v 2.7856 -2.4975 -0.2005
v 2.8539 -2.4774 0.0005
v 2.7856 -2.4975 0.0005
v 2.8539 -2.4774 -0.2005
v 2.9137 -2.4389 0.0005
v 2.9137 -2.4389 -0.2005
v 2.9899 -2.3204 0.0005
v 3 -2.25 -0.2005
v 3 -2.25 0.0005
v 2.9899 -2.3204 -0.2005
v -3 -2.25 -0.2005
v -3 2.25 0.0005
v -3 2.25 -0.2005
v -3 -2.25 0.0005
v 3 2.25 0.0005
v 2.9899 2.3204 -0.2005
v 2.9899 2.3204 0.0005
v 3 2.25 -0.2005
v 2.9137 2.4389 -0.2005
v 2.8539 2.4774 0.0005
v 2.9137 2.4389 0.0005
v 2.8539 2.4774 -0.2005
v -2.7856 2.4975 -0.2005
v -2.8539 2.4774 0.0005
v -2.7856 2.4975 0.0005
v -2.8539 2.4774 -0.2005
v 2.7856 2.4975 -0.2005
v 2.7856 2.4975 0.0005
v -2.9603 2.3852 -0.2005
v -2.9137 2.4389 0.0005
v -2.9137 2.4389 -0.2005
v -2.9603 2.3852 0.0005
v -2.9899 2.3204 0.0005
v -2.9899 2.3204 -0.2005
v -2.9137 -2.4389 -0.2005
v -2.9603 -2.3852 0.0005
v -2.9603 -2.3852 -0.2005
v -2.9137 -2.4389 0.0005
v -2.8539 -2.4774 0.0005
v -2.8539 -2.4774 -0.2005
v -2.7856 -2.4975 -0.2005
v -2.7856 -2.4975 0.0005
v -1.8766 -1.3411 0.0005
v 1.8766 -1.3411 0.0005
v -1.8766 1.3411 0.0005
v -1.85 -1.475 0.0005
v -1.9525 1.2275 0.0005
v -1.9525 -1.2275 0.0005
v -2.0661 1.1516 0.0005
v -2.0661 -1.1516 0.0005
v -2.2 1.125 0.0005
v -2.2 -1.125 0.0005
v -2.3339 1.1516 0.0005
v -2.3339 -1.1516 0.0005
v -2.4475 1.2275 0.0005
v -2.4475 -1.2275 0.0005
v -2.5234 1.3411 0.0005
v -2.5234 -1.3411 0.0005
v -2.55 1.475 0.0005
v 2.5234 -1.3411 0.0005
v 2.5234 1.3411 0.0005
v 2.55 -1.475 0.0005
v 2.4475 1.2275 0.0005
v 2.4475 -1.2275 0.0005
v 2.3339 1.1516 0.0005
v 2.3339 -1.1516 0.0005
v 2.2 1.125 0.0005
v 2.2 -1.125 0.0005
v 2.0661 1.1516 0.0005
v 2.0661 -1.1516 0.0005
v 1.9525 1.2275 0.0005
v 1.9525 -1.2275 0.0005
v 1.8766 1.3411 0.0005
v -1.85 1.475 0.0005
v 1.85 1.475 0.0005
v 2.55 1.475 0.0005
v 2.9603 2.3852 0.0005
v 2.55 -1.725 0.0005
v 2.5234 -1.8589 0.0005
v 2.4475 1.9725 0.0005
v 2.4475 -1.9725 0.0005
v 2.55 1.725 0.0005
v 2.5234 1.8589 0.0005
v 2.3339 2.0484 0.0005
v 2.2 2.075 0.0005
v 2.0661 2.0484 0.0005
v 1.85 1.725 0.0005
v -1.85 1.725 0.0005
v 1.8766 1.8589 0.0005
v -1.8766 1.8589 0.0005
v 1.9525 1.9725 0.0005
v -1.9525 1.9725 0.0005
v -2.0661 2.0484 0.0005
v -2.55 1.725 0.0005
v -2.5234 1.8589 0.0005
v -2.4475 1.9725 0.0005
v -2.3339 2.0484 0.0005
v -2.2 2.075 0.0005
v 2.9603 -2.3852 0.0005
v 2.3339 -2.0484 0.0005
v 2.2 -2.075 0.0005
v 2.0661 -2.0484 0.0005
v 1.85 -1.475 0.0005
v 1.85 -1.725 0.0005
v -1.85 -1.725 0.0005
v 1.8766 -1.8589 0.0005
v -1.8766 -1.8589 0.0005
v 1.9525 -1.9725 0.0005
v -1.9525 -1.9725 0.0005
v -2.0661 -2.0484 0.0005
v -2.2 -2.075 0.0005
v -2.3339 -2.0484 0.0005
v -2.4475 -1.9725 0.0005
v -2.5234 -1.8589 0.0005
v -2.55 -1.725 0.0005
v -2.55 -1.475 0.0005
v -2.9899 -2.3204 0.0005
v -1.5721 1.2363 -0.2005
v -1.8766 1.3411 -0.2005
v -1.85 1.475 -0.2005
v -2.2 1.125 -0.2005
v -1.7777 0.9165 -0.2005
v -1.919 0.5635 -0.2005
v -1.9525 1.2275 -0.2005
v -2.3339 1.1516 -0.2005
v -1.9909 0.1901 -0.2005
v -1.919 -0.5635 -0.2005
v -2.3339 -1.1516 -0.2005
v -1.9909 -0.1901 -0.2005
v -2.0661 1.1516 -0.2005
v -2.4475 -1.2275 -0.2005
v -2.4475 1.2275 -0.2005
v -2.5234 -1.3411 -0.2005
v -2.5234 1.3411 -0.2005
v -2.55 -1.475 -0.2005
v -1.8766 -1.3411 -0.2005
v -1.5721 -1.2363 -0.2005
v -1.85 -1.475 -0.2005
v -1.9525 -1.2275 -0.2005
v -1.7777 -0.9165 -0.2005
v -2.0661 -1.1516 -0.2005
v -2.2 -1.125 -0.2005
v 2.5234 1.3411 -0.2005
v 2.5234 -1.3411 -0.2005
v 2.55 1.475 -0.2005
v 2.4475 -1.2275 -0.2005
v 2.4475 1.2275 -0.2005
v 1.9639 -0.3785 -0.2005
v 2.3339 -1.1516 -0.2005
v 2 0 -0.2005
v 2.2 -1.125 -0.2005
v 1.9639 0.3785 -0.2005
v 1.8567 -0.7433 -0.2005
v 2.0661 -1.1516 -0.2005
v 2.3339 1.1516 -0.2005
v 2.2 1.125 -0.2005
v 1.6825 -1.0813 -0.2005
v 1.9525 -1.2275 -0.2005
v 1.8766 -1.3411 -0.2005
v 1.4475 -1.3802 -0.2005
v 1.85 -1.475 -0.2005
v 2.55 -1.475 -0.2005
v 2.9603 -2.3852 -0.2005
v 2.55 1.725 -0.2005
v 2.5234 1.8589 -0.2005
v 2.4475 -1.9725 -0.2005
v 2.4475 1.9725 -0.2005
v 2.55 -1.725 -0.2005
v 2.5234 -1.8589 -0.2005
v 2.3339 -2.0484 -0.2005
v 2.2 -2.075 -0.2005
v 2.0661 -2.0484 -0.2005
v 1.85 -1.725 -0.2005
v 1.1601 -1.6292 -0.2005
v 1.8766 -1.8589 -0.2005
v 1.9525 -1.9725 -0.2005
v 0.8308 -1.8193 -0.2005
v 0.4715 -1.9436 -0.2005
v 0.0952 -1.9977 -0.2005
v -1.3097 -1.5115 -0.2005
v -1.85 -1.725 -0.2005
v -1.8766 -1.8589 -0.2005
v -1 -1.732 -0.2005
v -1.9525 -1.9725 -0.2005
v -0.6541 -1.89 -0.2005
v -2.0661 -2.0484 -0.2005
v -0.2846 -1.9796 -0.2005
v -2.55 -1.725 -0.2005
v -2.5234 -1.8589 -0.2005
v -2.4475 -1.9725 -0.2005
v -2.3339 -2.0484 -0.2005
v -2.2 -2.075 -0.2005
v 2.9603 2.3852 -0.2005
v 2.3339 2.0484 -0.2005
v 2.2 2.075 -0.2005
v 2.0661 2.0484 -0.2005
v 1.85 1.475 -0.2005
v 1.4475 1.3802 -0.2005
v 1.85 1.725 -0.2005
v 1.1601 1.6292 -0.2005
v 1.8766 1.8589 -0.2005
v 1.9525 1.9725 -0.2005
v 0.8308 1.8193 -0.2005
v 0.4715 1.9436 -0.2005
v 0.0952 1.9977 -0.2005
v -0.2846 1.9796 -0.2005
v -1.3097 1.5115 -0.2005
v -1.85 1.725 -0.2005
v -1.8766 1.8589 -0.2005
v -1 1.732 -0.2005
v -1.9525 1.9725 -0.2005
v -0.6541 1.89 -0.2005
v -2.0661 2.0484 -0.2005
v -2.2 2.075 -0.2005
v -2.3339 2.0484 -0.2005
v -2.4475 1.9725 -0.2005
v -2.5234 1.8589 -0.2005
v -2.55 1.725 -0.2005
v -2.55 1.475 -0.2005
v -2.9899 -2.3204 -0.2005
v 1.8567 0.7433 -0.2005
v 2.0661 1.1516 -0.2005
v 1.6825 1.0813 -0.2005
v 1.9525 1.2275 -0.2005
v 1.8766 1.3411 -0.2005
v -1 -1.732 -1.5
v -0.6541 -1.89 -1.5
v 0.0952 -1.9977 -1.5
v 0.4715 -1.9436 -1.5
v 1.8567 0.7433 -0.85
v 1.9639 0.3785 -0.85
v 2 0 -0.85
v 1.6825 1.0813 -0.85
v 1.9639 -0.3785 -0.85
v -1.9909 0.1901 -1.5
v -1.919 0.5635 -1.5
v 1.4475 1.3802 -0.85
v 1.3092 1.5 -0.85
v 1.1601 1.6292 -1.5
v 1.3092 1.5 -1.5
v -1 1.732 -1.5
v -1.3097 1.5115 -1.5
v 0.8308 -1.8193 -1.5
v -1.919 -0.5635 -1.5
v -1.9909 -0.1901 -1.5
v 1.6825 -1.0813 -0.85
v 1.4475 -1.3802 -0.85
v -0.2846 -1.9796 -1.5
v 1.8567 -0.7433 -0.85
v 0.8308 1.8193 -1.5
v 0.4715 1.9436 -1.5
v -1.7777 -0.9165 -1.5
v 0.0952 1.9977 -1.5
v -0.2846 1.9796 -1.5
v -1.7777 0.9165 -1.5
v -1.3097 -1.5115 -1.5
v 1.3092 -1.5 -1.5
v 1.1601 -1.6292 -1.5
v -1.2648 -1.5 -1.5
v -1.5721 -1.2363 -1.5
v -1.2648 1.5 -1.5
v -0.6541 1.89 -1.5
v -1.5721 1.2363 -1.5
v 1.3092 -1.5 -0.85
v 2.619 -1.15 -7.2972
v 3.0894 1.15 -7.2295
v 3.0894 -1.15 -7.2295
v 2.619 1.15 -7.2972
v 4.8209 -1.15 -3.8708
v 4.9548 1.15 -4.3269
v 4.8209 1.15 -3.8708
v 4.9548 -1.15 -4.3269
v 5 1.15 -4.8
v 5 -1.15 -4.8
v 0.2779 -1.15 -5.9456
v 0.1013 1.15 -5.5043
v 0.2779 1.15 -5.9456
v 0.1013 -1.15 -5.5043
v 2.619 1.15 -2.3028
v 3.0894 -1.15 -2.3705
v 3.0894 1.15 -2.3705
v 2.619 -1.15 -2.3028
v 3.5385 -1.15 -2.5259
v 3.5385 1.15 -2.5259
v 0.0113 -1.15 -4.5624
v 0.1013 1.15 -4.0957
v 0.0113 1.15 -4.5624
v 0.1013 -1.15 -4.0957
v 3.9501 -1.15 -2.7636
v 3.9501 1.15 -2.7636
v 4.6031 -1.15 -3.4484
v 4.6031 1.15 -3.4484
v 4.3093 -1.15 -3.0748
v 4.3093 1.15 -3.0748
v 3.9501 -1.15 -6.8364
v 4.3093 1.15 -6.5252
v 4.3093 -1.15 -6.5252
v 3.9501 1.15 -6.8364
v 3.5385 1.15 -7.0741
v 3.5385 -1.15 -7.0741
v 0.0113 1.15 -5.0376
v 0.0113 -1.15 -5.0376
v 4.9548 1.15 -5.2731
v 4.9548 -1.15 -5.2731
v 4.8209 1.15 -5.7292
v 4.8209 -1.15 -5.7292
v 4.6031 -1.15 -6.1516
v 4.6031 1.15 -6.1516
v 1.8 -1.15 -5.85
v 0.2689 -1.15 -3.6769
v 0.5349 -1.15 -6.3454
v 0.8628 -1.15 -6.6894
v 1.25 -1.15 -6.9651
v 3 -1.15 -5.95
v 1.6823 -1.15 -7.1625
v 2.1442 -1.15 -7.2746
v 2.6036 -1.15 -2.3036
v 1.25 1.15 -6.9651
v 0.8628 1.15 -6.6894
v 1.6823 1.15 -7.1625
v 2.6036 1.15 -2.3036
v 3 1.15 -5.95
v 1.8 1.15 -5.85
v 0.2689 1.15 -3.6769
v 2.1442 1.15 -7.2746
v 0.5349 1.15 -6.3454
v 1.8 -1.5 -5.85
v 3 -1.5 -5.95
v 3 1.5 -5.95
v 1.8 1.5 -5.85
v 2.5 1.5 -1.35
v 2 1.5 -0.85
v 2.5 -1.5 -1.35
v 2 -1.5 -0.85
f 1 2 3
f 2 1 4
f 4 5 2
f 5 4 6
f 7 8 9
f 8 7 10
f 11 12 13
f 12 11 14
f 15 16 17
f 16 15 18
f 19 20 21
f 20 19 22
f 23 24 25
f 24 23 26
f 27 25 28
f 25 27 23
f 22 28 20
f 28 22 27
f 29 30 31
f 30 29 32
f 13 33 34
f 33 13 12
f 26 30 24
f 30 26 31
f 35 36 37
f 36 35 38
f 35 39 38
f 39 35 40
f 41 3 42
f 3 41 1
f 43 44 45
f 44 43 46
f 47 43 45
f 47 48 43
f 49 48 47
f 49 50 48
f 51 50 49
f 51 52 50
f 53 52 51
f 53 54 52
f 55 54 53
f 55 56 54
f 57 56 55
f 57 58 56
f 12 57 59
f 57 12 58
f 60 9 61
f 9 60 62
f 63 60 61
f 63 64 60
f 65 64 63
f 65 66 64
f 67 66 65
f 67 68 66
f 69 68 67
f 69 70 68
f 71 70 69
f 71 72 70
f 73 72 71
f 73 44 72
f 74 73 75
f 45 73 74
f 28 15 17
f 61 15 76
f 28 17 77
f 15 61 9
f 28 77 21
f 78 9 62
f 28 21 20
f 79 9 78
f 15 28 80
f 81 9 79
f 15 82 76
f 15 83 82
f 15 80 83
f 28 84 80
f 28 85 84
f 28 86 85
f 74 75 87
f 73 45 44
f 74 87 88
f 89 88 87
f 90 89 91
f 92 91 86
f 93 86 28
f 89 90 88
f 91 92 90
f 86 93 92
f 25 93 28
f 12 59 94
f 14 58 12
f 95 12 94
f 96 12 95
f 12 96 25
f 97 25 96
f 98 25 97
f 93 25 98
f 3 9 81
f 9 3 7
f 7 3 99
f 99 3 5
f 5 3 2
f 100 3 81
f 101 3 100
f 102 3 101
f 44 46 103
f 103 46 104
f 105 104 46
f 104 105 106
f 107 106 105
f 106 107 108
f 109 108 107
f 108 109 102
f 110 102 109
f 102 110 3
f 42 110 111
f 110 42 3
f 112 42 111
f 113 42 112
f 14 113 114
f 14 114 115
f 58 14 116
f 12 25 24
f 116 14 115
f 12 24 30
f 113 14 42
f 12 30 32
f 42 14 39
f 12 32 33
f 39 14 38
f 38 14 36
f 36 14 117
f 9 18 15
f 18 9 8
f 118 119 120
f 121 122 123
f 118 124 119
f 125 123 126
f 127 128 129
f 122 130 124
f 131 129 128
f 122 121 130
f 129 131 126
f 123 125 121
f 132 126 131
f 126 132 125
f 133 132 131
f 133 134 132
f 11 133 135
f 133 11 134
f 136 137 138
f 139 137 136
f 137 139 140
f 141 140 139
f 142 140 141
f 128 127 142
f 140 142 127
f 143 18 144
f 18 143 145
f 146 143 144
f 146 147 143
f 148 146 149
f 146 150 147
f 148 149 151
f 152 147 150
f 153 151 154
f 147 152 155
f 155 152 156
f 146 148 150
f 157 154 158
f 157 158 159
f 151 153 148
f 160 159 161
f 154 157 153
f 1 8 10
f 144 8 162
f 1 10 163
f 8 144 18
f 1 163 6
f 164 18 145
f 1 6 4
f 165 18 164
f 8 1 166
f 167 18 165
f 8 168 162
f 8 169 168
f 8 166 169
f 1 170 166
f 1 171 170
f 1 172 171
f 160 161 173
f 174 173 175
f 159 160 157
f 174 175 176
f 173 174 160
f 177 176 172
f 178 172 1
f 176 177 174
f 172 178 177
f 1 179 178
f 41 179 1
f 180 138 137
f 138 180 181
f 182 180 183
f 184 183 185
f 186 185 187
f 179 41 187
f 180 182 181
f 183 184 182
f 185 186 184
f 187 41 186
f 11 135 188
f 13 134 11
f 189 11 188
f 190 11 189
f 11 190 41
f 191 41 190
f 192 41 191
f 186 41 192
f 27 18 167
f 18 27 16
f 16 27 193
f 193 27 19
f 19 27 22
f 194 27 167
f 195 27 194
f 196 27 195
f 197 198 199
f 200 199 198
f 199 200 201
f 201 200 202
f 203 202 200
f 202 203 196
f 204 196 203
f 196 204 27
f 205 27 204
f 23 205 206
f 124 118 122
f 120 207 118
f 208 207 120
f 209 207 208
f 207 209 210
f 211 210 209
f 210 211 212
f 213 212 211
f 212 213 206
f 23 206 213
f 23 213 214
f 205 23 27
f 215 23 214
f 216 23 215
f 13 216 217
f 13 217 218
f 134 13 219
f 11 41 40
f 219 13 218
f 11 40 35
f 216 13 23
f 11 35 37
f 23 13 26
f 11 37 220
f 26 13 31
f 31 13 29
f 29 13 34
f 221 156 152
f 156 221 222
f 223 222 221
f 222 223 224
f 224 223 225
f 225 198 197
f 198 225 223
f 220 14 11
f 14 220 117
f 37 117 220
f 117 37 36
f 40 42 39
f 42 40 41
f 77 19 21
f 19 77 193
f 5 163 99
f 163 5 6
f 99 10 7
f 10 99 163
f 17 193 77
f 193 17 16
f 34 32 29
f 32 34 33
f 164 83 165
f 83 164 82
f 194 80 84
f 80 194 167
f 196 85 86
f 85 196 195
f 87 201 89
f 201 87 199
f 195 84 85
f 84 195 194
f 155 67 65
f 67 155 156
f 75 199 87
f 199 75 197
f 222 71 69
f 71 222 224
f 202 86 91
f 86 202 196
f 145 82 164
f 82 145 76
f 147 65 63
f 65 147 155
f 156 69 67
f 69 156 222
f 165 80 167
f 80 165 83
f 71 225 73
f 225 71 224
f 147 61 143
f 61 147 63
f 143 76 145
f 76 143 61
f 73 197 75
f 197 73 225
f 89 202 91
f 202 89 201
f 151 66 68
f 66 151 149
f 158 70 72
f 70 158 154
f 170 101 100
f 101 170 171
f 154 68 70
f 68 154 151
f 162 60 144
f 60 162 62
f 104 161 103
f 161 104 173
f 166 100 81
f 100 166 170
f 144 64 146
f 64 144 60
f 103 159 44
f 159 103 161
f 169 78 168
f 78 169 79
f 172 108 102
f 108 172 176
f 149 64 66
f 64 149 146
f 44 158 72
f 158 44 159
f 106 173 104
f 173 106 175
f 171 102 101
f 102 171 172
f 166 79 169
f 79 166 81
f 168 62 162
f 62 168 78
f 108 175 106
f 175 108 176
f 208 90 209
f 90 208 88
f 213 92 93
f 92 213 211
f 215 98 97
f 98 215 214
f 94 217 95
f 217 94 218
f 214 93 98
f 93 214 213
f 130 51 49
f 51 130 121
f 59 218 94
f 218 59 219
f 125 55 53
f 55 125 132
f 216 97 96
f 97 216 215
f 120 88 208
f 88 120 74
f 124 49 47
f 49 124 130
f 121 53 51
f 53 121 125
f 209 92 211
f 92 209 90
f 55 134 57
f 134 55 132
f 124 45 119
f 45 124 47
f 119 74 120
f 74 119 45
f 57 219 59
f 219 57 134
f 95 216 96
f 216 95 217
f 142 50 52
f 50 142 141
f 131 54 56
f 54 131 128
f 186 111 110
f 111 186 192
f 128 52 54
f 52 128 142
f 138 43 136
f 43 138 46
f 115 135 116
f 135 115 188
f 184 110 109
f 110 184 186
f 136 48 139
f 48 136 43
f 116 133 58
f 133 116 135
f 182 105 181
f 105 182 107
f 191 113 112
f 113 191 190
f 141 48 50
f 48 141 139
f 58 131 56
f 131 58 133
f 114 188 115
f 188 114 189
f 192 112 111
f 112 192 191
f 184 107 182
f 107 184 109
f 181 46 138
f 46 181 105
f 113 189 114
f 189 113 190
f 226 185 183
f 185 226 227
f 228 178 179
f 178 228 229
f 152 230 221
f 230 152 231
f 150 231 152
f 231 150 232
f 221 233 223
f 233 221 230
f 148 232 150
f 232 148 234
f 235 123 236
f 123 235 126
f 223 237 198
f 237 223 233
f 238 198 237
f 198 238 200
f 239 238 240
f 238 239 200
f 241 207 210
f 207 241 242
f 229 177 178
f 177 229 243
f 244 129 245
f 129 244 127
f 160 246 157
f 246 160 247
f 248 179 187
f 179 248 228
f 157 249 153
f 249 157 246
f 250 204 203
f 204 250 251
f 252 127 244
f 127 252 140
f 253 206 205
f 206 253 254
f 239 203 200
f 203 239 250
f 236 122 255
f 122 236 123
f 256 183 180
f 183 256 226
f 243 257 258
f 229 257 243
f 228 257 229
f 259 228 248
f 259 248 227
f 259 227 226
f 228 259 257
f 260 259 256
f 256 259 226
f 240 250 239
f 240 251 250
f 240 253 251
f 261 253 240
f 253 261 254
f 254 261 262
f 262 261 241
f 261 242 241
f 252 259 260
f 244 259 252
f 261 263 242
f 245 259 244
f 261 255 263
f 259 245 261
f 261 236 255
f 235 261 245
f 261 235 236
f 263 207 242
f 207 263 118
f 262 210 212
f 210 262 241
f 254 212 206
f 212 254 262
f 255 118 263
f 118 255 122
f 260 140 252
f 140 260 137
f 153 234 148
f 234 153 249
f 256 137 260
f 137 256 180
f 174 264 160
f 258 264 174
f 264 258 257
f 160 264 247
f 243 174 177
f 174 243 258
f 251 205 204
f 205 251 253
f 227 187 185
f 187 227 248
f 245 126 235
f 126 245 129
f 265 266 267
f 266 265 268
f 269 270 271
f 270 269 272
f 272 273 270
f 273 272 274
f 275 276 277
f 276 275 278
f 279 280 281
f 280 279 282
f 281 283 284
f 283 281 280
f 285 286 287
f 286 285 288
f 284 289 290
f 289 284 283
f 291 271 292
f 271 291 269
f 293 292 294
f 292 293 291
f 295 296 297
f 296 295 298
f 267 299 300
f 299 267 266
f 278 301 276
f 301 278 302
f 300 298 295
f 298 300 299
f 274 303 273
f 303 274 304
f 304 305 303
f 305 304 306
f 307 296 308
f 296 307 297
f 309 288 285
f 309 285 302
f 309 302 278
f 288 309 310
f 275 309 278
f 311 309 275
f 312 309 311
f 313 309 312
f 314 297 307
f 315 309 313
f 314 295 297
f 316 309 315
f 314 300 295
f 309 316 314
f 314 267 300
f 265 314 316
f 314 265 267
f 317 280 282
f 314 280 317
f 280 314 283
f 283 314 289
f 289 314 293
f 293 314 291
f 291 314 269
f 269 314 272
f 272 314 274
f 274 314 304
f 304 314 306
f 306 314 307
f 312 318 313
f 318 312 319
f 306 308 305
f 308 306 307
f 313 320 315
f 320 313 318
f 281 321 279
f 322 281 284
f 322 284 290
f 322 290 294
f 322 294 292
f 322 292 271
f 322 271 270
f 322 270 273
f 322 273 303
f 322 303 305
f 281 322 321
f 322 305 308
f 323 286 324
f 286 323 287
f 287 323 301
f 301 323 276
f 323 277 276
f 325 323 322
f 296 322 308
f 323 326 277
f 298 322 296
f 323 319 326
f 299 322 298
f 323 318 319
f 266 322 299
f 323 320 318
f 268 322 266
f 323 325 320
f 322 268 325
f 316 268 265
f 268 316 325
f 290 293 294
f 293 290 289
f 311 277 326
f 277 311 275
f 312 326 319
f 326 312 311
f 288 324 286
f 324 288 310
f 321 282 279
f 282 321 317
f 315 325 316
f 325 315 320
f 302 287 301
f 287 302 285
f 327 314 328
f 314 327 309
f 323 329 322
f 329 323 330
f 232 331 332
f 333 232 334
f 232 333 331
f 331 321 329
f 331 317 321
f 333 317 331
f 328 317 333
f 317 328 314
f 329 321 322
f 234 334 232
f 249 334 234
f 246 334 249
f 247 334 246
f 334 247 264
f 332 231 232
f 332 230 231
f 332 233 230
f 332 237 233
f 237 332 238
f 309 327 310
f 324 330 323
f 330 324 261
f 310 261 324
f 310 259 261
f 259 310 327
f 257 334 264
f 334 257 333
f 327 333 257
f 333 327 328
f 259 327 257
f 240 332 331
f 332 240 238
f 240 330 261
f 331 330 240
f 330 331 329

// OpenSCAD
fixing_plate_t = 0.2;
hinge_cylinder_h = 1.3;
hinge_cylinder_d = 4;

module wheel_assembly()
{
    fixing_plate();
    hinge_cylinder(-fixing_plate_t);
    wheel(-fixing_plate_t-hinge_cylinder_h);
    wheel_fixture(-fixing_plate_t-hinge_cylinder_h/2);
}

module fixing_plate()
{
    fixing_plate_l = 6;
    fixing_plate_w = 5;
    rounded_end_d = 0.5;
    hole_dx = 0.8;
    hole_dy = 0.9;
    
    translate([0,0,-fixing_plate_t/2]) 
    difference()
    {
        minkowski()
        {
            cube([fixing_plate_l-rounded_end_d, fixing_plate_w-rounded_end_d, 0.001], center = true);
            cylinder(d=rounded_end_d,h=fixing_plate_t, center=true, $fn = 22);
        }
        translate([(fixing_plate_l/2-hole_dx),(fixing_plate_w/2-hole_dy),0]) 
        fixing_plate_hole();
        translate([(fixing_plate_l/2-hole_dx),-(fixing_plate_w/2-hole_dy),0]) 
        fixing_plate_hole();
        translate([-(fixing_plate_l/2-hole_dx),(fixing_plate_w/2-hole_dy), 0]) 
        fixing_plate_hole();
        translate([-(fixing_plate_l/2-hole_dx),-(fixing_plate_w/2-hole_dy),0]) 
        fixing_plate_hole();
    }
}

module fixing_plate_hole()
{
    hole_size = 0.7;
    center_points_d = 0.25;
    hole_h = fixing_plate_t + 0.1;

    hull() {
        translate([0,-center_points_d/2,0])
        cylinder(h=hole_h, d=hole_size, center = true, $fn = 16);

        translate([0,center_points_d/2,0])
        cylinder(h=hole_h, d=hole_size, center = true, $fn = 16);
    }
}

module hinge_cylinder(top_y)
{
    
    translate([0,0,top_y-hinge_cylinder_h/2])
    cylinder(d=hinge_cylinder_d,h=hinge_cylinder_h, center=true, $fn = 33);
}

module wheel(top_y)
{
    wheel_d = 5;
    wheel_t = 2.3;
    wheel_dz = 3.3;
    wheel_dx = 2.5;

    color([0.75,0.75,0.75,1])
    translate([wheel_dx,0,top_y-wheel_dz])
    rotate([90,0,0])
    cylinder(d=wheel_d,h=wheel_t, center=true, $fn = 33);
}

module wheel_fixture(top_y)
{
    translate([0,0,top_y])
    rotate([-90,0,0])
    linear_extrude(3, center = true) 
        polygon(points=[[-1.3,0],
            [hinge_cylinder_d/2, 0],
            [2.5, 0.5],
            [3.0, 5.1],
            [1.8, 5.0],
            [-1.3,0.6]]);
 
}

wheel_assembly();
